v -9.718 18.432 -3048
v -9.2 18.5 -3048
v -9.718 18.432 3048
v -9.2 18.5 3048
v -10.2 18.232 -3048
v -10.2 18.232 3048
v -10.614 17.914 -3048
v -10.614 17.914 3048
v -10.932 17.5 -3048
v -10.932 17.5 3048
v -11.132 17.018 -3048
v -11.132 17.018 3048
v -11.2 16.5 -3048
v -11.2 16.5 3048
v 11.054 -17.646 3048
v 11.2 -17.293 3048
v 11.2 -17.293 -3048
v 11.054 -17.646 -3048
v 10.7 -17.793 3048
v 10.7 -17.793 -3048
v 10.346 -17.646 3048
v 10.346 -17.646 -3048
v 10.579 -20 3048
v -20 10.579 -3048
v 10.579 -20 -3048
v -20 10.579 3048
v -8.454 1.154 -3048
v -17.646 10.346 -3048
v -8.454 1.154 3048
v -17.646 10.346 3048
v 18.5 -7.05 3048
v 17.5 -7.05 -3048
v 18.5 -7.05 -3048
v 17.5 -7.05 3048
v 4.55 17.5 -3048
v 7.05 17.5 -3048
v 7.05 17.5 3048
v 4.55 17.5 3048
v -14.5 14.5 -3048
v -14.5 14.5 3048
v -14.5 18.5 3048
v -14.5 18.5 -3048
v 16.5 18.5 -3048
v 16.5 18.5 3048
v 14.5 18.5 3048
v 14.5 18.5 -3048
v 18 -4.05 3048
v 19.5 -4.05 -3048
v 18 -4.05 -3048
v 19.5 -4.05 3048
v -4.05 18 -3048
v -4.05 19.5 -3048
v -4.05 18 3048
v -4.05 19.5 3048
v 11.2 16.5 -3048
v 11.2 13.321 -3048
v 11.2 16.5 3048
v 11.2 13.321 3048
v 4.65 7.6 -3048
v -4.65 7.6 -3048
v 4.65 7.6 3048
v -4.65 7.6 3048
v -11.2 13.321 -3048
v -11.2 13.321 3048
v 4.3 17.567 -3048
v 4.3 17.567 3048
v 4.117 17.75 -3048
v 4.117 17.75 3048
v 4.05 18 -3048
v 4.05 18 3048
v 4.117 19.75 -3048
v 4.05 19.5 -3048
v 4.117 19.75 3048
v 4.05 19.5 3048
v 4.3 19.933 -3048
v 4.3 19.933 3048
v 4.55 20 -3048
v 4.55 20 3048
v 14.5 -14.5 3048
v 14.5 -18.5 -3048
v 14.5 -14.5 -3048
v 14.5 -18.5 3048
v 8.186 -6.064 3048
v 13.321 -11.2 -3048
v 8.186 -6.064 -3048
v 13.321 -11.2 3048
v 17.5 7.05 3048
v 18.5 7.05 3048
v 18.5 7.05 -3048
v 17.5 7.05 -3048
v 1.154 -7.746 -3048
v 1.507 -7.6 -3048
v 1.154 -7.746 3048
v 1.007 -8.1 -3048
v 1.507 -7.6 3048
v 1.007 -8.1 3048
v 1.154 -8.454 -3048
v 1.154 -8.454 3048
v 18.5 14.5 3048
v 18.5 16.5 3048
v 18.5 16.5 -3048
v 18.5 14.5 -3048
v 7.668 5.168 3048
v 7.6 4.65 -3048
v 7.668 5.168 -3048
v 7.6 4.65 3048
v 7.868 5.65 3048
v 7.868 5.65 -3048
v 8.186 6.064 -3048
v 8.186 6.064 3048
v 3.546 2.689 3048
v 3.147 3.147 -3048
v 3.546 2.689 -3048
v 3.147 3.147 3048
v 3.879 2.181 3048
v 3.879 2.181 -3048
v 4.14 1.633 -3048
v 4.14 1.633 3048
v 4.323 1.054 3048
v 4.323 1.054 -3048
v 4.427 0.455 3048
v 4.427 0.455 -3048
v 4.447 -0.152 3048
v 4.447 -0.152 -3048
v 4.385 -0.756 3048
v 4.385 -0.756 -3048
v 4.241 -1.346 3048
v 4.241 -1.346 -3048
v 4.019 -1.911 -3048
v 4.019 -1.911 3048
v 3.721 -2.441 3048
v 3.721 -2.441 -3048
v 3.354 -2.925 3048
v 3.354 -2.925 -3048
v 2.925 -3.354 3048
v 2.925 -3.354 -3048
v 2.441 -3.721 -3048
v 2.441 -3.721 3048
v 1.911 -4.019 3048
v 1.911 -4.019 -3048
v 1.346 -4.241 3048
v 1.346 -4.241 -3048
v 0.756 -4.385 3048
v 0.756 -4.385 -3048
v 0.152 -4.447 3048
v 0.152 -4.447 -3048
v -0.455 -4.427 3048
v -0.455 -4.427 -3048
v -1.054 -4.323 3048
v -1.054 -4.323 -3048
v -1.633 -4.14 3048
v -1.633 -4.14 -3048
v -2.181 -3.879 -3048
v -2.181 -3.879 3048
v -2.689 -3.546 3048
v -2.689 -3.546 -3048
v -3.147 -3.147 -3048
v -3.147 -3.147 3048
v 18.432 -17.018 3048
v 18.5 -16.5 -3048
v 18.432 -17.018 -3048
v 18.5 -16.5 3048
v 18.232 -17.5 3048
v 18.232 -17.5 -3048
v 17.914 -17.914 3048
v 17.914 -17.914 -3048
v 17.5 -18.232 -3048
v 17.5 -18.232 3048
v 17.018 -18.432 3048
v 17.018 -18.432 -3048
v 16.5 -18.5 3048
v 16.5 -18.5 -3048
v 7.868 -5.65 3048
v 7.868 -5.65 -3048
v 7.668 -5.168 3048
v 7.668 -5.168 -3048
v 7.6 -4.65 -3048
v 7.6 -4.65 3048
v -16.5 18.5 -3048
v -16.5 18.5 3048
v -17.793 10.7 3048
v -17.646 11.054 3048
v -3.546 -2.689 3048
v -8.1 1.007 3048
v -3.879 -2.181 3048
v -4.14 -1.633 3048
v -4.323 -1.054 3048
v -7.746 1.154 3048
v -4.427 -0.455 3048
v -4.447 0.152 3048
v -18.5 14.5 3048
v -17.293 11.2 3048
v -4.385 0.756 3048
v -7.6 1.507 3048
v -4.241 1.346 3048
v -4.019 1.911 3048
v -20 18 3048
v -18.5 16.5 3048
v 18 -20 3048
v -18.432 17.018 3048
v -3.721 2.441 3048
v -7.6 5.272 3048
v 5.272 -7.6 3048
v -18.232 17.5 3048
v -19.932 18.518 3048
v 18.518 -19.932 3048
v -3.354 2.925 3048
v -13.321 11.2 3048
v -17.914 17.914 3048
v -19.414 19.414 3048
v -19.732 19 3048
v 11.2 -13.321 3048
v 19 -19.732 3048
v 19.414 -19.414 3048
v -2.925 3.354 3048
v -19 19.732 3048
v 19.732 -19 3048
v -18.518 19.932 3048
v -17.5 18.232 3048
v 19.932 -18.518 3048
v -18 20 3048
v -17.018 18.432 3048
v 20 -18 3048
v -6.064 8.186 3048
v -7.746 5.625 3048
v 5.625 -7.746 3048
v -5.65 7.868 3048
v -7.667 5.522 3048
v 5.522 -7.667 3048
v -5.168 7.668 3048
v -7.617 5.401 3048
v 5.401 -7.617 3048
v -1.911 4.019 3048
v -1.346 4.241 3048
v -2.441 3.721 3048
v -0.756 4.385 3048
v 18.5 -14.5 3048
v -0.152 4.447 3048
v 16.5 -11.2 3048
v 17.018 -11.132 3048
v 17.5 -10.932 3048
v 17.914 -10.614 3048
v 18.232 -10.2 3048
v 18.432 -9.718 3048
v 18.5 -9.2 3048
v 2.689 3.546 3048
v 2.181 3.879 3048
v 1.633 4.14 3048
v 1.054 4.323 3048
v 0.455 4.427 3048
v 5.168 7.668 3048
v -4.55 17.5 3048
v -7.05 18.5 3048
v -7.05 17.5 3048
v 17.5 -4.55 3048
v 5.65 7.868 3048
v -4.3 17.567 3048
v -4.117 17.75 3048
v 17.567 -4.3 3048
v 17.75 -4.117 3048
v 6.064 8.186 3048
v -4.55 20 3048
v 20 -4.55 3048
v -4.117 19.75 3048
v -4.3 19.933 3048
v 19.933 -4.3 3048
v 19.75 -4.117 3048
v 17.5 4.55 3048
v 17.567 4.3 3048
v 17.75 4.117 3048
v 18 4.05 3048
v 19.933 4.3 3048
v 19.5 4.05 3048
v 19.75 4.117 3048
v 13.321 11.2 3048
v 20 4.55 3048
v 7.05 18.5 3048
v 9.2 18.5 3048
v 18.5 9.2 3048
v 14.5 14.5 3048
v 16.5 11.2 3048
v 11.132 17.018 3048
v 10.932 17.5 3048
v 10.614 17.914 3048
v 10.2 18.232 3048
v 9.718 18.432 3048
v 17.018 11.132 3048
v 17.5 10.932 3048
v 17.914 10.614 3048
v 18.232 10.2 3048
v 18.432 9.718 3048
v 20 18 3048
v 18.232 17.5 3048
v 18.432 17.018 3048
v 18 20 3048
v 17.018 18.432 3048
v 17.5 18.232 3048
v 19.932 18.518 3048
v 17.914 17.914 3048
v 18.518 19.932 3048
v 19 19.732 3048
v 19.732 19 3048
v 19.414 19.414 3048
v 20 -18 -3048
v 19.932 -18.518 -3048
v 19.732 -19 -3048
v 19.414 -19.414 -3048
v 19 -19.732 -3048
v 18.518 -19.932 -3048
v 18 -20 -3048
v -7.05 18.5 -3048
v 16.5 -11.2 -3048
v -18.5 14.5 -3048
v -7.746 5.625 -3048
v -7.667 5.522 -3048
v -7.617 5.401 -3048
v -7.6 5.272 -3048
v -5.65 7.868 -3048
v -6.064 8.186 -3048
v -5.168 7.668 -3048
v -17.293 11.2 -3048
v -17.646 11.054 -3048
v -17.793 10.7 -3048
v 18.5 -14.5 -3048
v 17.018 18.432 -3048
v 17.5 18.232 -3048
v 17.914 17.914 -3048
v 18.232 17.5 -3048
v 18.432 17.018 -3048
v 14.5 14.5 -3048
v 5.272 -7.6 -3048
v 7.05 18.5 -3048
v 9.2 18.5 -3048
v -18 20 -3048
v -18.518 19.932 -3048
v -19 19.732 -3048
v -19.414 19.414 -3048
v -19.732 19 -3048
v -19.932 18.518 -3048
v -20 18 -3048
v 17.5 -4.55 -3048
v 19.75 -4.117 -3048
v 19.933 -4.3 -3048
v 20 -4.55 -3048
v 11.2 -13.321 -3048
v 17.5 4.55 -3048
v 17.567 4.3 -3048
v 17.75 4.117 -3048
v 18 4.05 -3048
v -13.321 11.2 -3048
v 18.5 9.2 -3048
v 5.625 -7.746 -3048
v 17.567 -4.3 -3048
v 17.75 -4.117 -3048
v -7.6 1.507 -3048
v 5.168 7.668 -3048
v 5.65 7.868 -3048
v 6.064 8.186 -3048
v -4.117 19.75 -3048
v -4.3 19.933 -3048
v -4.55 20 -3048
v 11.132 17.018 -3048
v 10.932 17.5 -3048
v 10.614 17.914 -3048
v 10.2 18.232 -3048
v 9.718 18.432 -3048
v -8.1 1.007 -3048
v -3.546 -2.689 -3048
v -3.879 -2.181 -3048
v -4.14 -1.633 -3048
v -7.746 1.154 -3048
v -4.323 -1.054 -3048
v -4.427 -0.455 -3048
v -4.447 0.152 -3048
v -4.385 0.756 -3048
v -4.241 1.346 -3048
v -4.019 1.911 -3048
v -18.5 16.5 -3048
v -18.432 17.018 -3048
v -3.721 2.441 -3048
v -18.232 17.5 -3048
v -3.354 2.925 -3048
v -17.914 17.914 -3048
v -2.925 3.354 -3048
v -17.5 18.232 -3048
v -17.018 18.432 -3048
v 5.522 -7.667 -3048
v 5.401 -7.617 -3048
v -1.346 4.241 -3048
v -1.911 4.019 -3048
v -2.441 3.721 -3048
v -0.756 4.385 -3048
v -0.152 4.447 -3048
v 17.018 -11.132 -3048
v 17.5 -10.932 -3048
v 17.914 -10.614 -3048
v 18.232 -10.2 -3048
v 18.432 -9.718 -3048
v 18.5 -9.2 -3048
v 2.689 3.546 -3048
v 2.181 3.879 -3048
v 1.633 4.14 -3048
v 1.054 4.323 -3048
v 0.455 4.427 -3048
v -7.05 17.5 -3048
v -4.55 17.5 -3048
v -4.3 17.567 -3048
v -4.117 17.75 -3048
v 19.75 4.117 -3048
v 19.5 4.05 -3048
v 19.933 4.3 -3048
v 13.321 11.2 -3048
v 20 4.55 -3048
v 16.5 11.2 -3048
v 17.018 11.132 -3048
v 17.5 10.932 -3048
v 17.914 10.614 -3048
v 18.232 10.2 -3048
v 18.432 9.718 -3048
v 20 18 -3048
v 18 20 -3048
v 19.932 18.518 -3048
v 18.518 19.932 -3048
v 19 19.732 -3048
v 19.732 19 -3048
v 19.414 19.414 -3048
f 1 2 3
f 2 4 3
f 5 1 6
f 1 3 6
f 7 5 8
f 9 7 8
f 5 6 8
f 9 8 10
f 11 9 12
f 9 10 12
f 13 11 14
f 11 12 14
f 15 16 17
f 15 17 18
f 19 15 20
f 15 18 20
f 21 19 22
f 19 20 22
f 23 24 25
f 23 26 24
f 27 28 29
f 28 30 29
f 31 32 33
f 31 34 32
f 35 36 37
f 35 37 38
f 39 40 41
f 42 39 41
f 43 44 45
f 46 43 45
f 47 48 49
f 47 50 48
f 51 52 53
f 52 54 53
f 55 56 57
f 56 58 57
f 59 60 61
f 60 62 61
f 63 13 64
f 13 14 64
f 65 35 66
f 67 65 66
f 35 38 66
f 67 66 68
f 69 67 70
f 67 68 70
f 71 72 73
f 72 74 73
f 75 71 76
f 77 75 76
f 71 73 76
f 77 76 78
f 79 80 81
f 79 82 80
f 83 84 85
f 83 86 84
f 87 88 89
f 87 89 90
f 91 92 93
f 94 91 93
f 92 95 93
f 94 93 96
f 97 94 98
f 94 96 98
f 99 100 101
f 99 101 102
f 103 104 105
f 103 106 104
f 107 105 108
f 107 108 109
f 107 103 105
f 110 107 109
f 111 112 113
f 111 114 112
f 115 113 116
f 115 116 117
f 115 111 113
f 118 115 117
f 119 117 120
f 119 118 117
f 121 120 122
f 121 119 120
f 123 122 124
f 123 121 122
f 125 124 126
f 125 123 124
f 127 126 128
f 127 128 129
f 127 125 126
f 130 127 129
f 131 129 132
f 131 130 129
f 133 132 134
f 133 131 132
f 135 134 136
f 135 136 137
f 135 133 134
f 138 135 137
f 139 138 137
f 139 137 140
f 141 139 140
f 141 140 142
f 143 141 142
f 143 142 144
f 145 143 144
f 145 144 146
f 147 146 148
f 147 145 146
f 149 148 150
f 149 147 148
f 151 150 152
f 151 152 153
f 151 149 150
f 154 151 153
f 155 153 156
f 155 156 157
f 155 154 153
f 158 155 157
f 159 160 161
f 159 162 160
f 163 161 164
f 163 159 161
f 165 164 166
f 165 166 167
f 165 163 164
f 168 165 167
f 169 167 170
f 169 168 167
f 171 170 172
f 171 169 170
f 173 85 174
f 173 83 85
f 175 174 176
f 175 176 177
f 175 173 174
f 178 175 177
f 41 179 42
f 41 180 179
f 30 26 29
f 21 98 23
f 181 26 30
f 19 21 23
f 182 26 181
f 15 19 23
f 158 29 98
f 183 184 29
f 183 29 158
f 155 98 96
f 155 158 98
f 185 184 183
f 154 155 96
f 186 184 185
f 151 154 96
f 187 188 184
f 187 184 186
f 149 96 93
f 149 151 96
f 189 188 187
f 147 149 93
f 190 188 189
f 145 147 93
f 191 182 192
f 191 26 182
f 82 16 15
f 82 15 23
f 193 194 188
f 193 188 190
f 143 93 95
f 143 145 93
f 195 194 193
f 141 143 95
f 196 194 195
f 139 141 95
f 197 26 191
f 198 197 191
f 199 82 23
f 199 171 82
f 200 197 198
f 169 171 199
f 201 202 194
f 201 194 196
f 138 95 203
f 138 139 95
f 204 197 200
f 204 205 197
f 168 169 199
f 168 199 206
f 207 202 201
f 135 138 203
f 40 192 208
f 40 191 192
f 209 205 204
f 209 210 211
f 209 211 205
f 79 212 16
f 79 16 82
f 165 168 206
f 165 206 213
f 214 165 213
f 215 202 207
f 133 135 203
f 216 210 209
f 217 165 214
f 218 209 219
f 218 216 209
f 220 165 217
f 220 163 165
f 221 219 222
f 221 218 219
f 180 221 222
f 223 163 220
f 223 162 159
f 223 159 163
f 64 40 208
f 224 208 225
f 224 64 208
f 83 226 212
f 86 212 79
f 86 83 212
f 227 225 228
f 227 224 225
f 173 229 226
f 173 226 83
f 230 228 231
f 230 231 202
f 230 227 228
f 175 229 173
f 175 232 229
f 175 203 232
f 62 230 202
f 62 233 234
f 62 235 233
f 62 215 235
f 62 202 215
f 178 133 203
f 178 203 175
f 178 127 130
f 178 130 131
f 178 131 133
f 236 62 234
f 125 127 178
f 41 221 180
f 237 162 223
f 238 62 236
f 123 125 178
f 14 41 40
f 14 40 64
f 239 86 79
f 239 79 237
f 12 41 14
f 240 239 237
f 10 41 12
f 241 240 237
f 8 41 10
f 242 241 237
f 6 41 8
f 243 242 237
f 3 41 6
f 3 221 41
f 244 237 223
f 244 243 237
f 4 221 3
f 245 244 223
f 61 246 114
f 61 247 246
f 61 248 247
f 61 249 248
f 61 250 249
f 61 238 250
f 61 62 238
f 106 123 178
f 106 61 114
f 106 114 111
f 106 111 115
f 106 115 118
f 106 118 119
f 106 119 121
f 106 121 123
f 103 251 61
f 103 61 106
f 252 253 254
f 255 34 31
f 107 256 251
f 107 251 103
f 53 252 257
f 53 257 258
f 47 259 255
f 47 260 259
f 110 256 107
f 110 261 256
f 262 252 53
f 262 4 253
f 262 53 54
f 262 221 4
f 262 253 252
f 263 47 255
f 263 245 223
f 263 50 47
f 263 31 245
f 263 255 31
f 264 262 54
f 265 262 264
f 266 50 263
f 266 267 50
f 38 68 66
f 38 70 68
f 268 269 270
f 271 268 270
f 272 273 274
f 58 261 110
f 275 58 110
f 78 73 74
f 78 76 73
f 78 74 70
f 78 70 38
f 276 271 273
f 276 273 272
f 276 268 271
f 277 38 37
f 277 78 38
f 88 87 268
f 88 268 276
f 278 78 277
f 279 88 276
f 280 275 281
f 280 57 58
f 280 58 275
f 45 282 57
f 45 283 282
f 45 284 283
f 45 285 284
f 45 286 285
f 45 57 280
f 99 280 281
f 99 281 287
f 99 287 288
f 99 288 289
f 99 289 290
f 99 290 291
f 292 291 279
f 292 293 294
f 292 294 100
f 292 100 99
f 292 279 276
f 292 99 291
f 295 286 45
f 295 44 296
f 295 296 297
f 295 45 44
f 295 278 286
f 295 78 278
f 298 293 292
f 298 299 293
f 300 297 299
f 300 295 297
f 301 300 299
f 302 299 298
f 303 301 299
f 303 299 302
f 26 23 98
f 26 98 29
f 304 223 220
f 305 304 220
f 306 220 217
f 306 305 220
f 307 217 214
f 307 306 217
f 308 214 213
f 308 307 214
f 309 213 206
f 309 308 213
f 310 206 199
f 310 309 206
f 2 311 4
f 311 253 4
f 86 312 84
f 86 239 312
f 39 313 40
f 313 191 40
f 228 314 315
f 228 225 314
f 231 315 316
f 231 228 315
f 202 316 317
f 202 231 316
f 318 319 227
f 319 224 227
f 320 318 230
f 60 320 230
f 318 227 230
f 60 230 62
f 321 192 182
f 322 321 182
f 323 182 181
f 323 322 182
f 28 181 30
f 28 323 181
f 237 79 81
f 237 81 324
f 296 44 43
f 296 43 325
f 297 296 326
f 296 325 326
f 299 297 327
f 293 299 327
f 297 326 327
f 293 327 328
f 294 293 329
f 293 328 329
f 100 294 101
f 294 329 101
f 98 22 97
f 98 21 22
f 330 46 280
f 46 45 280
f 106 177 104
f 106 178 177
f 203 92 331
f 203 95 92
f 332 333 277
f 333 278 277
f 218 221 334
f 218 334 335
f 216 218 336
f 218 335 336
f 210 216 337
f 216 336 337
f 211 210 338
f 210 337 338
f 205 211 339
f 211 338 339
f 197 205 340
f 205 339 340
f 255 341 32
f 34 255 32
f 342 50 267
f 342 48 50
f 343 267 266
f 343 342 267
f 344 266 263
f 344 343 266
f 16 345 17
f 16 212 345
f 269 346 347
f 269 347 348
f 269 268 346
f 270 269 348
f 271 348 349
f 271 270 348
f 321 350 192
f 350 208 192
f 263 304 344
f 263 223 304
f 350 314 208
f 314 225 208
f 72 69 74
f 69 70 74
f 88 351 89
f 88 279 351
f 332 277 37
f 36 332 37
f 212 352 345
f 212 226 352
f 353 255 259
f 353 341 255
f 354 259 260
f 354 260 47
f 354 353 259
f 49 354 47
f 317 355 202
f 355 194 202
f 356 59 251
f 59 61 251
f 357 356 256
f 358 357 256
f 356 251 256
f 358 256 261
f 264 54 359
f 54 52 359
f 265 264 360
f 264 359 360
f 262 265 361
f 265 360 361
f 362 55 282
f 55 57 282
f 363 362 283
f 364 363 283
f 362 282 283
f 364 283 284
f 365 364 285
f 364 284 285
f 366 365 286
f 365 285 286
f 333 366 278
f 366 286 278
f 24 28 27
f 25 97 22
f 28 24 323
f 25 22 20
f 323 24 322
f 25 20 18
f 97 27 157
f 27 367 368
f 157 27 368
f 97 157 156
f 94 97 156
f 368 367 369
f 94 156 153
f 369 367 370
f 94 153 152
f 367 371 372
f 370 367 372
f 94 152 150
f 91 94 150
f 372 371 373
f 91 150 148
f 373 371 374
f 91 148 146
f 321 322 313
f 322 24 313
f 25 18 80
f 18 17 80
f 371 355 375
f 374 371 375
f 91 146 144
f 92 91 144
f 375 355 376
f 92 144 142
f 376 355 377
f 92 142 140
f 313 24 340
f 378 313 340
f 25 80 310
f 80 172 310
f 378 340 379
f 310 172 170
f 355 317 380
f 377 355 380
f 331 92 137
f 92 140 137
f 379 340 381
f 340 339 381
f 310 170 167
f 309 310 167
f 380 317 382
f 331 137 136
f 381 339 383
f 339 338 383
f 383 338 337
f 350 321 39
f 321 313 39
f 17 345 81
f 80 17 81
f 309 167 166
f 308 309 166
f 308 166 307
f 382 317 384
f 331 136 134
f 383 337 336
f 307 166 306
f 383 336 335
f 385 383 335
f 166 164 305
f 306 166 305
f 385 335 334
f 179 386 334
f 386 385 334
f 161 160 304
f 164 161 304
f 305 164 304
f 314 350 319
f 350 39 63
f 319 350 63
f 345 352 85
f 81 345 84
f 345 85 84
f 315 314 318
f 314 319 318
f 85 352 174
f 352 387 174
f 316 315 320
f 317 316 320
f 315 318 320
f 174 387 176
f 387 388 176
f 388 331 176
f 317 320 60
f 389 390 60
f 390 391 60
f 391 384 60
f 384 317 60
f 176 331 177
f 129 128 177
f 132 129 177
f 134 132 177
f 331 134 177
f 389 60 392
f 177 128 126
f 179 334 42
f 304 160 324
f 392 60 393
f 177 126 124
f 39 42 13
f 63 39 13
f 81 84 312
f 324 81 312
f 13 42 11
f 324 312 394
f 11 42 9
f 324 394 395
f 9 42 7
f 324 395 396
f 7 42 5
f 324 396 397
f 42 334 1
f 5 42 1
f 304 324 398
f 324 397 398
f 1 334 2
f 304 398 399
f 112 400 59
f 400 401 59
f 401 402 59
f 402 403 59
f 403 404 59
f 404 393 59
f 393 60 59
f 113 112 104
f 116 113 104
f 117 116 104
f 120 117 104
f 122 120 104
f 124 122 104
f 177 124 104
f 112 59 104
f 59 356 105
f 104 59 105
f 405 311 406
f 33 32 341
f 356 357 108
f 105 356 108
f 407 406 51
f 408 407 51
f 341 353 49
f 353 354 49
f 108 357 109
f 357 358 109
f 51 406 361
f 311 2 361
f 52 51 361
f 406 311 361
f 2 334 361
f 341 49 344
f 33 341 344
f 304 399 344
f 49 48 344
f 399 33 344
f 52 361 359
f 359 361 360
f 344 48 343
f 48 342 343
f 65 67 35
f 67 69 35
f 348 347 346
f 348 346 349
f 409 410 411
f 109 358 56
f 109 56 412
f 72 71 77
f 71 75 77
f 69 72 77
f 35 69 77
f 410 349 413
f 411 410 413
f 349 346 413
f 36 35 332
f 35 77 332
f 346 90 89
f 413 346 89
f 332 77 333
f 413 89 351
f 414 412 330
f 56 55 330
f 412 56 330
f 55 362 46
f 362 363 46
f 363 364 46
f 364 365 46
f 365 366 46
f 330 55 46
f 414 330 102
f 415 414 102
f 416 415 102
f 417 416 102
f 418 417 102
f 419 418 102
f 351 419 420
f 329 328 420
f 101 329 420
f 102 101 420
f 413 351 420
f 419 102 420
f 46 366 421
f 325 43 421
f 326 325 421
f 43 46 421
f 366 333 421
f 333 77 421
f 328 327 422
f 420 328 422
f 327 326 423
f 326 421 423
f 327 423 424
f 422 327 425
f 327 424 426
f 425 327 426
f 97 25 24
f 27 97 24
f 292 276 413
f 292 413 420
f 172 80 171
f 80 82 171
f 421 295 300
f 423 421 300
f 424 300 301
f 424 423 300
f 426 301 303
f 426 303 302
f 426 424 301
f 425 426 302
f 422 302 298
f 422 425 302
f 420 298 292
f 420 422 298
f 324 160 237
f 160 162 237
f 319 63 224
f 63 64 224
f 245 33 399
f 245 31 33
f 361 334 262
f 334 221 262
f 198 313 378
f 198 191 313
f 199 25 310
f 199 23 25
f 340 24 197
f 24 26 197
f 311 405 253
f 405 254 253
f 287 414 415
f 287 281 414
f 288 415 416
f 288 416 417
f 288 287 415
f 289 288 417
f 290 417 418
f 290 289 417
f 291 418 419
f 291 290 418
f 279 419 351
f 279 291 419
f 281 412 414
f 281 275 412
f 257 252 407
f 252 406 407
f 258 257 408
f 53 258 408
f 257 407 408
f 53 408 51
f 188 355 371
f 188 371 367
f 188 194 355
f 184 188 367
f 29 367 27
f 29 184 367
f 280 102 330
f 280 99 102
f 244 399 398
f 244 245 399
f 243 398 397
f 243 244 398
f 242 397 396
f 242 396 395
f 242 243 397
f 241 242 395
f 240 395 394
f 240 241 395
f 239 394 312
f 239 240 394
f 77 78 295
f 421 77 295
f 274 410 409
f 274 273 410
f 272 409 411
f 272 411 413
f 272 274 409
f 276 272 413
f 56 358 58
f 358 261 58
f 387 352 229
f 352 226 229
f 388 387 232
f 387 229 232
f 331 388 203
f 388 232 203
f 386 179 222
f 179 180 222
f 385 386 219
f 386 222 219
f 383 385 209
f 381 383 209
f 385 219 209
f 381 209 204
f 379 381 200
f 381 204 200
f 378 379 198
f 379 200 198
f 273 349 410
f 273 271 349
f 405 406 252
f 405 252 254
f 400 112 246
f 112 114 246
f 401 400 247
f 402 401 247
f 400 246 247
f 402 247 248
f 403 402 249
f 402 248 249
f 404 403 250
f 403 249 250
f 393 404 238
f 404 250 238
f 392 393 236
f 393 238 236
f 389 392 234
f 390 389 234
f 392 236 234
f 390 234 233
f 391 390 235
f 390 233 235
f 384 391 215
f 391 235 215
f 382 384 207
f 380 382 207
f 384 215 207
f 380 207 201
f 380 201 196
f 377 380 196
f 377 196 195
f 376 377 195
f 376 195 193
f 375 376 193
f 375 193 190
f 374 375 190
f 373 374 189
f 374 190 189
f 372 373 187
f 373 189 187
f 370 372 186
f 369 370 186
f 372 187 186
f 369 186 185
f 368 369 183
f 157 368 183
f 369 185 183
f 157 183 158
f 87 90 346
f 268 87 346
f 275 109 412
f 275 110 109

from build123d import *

# Parameters (mm, degrees)
SKETCH3_W           = 4
SKETCH3_H           = 4
BOSS_EXTRUDE1_DEPTH = 3048
FILLET1_R           = 2
FILLET3_R           = 0.5
FILLET2_START       = -3049
FILLET2_DEPTH       = 6098
FILLET2_START_2     = -3048
FILLET2_2_DEPTH     = 6096


with BuildPart() as part:
    # Sketch3 → Boss-Extrude1 (new, symmetric)
    with BuildSketch(Plane.XY):
        with BuildLine():
            Line((18.5, 18.5), (14.5, 18.5))
            Line((14.5, 18.5), (14.5, 14.5))
            Line((14.5, 14.5), (3.146625176, 3.146625176))
            ThreePointArc((3.146625176, 3.146625176), (-3.146625176, 3.146625176), (-3.146625176, -3.146625176))
            Line((-3.146625176, -3.146625176), (-4.710660172, -4.710660172))
            Line((-4.710660172, -4.710660172), (-20, 10.578679656))
            Line((-20, 10.578679656), (-20, 20))
            Line((-20, 20), (-4.05, 20))
            Line((-4.05, 20), (-4.05, 17.5))
            Line((-4.05, 17.5), (-7.05, 17.5))
            Line((-7.05, 17.5), (-7.05, 18.5))
            Line((-7.05, 18.5), (-11.2, 18.5))
            Line((-11.2, 18.5), (-11.2, 13.321320344))
            Line((-11.2, 13.321320344), (-5.478679656, 7.6))
            Line((-5.478679656, 7.6), (5.478679656, 7.6))
            Line((5.478679656, 7.6), (11.2, 13.321320344))
            Line((11.2, 13.321320344), (11.2, 18.5))
            Line((11.2, 18.5), (7.05, 18.5))
            Line((7.05, 18.5), (7.05, 17.5))
            Line((7.05, 17.5), (4.05, 17.5))
            Line((4.05, 17.5), (4.05, 20))
            Line((4.05, 20), (20, 20))
            Line((20, 20), (18.5, 18.5))
        make_face()
        Polygon((-13.321320344, 11.2), (-18.5, 11.2), (-7.6, 0.3), (-7.6, 5.478679656), align=None, mode=Mode.SUBTRACT)
        with Locations((-16.5, 16.5)):
            Rectangle(SKETCH3_W, SKETCH3_H, mode=Mode.SUBTRACT)
    extrude(amount=BOSS_EXTRUDE1_DEPTH, both=True)

    # Fillet1
    fillet1_edges = [part.edges().sort_by_distance(p)[0] for p in [
        (-20, 20, 0),
        (-11.2, 18.5, 0),
        (-5.478679656, 7.6, 0),
        (5.478679656, 7.6, 0),
        (11.2, 18.5, 0),
        (-18.5, 18.5, 0),
    ]]
    fillet(fillet1_edges, radius=FILLET1_R)

    # Fillet3
    fillet3_edges = [part.edges().sort_by_distance(p)[0] for p in [
        (-4.05, 20, 0),
        (-4.05, 17.5, 0),
        (4.05, 17.5, 0),
        (4.05, 20, 0),
        (-7.6, 5.478679656, 0),
        (-18.5, 11.2, 0),
        (-7.6, 0.3, 0),
    ]]
    fillet(fillet3_edges, radius=FILLET3_R)

    # Mirror1: part across plane


with BuildPart() as part_1:
    add(part.part)
    add(part.part.mirror(Plane(origin=(3.146625176, 3.146625176, 3048), x_dir=(0, 0, 1), z_dir=(-0.7071067811865543, 0.7071067811865408, 0))))

    # Fillet2: read off the stored shape, not the designer's step
    # Fillet2 outline → Fillet2 (cut)
    with BuildSketch(Plane.XY.offset(FILLET2_START)):
        with BuildLine():
            Line((20, 20), (18, 20))
            ThreePointArc((18, 20), (19.414213562, 19.414213562), (20, 18))
            Line((20, 18), (20, 20))
        make_face()
    extrude(amount=FILLET2_DEPTH, mode=Mode.SUBTRACT)

    # Fillet2 2 outline → Fillet2 2 (add)
    with BuildSketch(Plane.XY.offset(FILLET2_START_2)):
        with BuildLine():
            ThreePointArc((16.5, 18.5), (17.914213562, 17.914213562), (18.5, 16.5))
            Line((18.5, 16.5), (18.5, 18.5))
            Line((18.5, 18.5), (16.5, 18.5))
        make_face()
    extrude(amount=FILLET2_2_DEPTH)


solid = part_1.part
